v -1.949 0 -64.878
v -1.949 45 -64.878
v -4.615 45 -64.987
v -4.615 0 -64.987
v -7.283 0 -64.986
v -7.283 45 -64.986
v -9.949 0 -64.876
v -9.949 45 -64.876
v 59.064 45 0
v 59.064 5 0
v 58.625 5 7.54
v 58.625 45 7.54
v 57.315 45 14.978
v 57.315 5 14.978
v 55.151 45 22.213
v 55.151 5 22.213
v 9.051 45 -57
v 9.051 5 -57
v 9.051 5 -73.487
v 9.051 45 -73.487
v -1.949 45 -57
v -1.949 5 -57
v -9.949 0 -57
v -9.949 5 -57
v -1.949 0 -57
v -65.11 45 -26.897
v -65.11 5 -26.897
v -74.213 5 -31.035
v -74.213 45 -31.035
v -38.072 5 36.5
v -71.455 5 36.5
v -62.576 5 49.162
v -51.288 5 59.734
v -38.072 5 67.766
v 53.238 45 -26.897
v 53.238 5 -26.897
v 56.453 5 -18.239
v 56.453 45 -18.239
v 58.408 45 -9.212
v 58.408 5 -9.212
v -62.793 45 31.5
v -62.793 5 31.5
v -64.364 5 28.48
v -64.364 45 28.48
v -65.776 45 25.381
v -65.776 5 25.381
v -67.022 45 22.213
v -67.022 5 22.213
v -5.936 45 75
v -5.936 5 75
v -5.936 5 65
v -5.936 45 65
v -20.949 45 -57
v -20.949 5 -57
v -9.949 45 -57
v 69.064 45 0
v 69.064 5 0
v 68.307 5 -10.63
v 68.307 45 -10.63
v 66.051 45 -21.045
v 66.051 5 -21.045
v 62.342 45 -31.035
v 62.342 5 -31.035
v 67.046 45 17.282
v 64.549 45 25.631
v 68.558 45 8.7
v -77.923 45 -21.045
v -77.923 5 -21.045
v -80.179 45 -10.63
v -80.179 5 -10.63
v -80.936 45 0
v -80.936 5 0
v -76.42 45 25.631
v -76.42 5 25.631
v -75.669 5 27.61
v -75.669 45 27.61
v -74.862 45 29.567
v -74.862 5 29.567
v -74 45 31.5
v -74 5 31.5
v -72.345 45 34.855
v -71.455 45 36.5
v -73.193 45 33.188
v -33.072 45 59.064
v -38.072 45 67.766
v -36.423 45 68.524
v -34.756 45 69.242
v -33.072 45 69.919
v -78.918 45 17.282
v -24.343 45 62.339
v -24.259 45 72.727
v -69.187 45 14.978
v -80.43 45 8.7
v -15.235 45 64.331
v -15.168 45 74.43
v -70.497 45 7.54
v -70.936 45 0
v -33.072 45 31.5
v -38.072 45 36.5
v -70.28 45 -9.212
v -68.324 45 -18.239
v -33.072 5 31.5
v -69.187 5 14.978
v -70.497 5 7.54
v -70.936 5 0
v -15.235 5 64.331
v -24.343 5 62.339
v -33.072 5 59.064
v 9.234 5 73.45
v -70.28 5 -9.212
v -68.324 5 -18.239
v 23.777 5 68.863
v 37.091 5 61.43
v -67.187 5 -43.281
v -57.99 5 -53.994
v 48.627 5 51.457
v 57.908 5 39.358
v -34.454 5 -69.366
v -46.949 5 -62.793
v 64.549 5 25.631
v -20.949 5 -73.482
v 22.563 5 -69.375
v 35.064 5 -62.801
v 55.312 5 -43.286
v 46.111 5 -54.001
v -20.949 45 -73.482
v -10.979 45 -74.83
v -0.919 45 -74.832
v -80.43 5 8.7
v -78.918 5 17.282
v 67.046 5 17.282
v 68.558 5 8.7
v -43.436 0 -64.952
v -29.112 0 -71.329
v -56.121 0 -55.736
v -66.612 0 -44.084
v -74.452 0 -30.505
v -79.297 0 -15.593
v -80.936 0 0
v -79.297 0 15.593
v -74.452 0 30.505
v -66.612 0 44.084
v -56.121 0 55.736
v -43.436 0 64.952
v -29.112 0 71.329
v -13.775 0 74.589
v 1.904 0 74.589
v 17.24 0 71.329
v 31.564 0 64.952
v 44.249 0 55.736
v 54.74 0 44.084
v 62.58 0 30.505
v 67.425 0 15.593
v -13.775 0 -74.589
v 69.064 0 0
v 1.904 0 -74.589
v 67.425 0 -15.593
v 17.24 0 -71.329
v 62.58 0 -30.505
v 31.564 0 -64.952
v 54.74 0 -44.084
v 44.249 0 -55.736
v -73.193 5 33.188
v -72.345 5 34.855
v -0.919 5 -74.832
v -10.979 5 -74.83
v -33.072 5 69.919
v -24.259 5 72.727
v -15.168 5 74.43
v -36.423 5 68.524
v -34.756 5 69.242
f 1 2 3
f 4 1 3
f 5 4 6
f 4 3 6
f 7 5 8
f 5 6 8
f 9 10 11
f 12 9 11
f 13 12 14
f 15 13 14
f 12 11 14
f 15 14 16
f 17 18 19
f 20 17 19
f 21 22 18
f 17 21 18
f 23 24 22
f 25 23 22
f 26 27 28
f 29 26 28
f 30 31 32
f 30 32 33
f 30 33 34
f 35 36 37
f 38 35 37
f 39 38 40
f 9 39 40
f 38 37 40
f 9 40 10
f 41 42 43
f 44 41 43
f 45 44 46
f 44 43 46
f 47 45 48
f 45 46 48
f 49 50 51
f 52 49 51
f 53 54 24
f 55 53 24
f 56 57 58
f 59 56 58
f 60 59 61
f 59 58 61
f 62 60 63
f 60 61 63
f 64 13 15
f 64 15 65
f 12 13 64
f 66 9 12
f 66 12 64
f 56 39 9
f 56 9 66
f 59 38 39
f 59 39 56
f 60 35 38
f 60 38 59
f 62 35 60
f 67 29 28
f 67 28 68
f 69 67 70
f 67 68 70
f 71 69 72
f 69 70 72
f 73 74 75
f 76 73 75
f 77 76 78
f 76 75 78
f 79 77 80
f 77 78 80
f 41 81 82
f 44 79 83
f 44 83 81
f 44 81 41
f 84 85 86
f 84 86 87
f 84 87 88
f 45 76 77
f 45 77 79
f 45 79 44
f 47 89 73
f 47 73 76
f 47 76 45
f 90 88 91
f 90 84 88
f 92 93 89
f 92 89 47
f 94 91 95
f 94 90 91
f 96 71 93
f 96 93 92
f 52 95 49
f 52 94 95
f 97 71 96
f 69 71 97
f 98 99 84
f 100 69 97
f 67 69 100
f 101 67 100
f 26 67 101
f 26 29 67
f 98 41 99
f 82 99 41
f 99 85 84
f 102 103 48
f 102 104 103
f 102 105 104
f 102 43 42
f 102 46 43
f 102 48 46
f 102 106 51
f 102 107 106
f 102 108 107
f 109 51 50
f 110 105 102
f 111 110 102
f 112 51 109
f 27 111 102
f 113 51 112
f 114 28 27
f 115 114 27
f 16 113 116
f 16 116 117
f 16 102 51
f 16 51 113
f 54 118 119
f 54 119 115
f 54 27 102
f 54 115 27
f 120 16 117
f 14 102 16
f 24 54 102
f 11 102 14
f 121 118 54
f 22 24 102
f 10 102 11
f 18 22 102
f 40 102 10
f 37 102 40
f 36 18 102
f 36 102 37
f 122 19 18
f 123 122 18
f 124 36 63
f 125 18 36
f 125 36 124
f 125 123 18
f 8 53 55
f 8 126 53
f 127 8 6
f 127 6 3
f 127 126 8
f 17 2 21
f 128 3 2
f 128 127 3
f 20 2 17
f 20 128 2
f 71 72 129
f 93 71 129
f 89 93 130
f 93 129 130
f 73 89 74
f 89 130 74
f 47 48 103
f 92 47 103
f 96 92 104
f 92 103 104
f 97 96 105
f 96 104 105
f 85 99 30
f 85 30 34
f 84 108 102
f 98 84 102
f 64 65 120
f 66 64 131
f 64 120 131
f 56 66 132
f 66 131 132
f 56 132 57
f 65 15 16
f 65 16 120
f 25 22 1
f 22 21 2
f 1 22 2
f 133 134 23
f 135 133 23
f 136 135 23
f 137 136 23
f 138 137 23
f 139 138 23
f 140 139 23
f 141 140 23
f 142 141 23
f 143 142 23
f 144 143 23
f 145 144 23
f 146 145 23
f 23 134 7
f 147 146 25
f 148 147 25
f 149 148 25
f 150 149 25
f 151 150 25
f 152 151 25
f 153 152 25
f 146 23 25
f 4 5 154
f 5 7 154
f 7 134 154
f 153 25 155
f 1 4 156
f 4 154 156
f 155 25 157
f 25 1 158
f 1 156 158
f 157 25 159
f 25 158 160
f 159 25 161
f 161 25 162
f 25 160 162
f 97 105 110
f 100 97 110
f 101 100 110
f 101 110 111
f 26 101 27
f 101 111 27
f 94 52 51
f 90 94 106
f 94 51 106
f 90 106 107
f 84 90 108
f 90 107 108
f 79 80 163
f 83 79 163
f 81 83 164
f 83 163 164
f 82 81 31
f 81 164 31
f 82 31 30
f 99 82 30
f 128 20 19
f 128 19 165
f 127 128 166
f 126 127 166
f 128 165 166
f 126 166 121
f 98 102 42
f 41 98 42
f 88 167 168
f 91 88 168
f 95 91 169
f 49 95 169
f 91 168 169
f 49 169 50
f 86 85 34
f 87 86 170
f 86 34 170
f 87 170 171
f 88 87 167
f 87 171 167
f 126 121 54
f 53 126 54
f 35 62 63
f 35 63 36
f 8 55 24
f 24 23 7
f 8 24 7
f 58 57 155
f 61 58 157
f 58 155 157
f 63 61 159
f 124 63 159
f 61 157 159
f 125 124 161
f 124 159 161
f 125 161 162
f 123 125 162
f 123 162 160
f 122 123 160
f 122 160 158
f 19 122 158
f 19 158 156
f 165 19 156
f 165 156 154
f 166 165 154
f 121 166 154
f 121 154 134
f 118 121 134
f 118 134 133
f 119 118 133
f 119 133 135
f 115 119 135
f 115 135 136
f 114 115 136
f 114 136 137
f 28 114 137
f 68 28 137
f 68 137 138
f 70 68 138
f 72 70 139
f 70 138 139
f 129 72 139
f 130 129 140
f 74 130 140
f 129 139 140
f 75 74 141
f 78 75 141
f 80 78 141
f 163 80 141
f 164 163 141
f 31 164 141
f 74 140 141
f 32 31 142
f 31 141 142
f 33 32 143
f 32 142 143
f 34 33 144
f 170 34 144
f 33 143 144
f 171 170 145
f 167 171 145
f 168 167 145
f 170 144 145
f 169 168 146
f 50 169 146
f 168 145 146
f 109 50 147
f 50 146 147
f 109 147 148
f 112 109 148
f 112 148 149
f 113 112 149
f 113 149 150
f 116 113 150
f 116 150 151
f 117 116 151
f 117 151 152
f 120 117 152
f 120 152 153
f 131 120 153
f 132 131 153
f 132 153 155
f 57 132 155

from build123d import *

# Parameters (mm, degrees)
SKETCH1_R           = 75
BOSS_EXTRUDE1_DEPTH = 5
CUT_EXTRUDE1_DEPTH  = 10
BOSS_EXTRUDE3_DEPTH = 40


with BuildPart() as part:
    # Sketch1 → Boss-Extrude1 (new body)
    with BuildSketch(Plane(origin=(0, 0, 0), x_dir=(1, 0, 0), z_dir=(0, 1, 0))):
        with Locations((-5.935816789, 0)):
            Circle(SKETCH1_R)
    extrude(amount=BOSS_EXTRUDE1_DEPTH)

    # Sketch2 → Cut-Extrude1 (cut)
    with BuildSketch(Plane(origin=(0, 5, 0), x_dir=(1, 0, 0), z_dir=(0, 1, 0))):
        with BuildLine():
            Line((-1.948906052, 56.999998596), (-1.948906052, 64.87761203))
            ThreePointArc((-1.948906052, 64.87761203), (-5.948930907, 64.999998677), (-9.948906052, 64.875997985))
            Line((-9.948906052, 64.875997985), (-9.948906052, 56.999998596))
            Line((-9.948906052, 56.999998596), (-1.948906052, 56.999998596))
        make_face()
    extrude(amount=-CUT_EXTRUDE1_DEPTH, mode=Mode.SUBTRACT)

    # Sketch2<5> → Boss-Extrude3 (add)
    with BuildSketch(Plane(origin=(0, 5, 0), x_dir=(1, 0, 0), z_dir=(0, 1, 0))):
        with BuildLine():
            Line((55.150755737, -22.213299101), (64.548689972, -25.630729732))
            ThreePointArc((64.548689972, -25.630729732), (69.007362578, 2.918881011), (62.34166902, 31.035220823))
            Line((62.34166902, 31.035220823), (53.238004246, 26.89719138))
            ThreePointArc((53.238004246, 26.89719138), (59.014938662, 2.529696877), (55.150755737, -22.213299101))
        make_face()
        with BuildLine():
            Line((-5.935816789, -75), (-5.935816789, -65))
            ThreePointArc((-5.935816789, -65), (-19.824804959, -63.49878745), (-33.072244718, -59.064492542))
            Line((-33.072244718, -59.064492542), (-33.072244718, -31.5))
            Line((-33.072244718, -31.5), (-62.793094248, -31.5))
            ThreePointArc((-62.793094248, -31.5), (-70.884734753, -2.576442379), (-65.109637824, 26.89719138))
            Line((-65.109637824, 26.89719138), (-74.213302599, 31.035220823))
            ThreePointArc((-74.213302599, 31.035220823), (-80.873336418, -3.06074368), (-71.454897979, -36.5))
            Line((-71.454897979, -36.5), (-38.072244718, -36.5))
            Line((-38.072244718, -36.5), (-38.072244718, -67.766141988))
            ThreePointArc((-38.072244718, -67.766141988), (-22.406083194, -73.169189722), (-5.935816789, -75))
        make_face()
        with BuildLine():
            ThreePointArc((-9.948906052, 64.875997985), (-5.948930907, 64.999998677), (-1.948906052, 64.87761203))
            Line((-1.948906052, 64.87761203), (-1.948906052, 56.999998596))
            Line((-1.948906052, 56.999998596), (9.051093948, 56.999998596))
            Line((9.051093948, 56.999998596), (9.051093948, 73.487362904))
            ThreePointArc((9.051093948, 73.487362904), (-5.949175962, 74.99999881), (-20.948906052, 73.482019235))
            Line((-20.948906052, 73.482019235), (-20.948906052, 56.999998596))
            Line((-20.948906052, 56.999998596), (-9.948906052, 56.999998596))
            Line((-9.948906052, 56.999998596), (-9.948906052, 64.875997985))
        make_face()
    extrude(amount=BOSS_EXTRUDE3_DEPTH)


solid = part.part
